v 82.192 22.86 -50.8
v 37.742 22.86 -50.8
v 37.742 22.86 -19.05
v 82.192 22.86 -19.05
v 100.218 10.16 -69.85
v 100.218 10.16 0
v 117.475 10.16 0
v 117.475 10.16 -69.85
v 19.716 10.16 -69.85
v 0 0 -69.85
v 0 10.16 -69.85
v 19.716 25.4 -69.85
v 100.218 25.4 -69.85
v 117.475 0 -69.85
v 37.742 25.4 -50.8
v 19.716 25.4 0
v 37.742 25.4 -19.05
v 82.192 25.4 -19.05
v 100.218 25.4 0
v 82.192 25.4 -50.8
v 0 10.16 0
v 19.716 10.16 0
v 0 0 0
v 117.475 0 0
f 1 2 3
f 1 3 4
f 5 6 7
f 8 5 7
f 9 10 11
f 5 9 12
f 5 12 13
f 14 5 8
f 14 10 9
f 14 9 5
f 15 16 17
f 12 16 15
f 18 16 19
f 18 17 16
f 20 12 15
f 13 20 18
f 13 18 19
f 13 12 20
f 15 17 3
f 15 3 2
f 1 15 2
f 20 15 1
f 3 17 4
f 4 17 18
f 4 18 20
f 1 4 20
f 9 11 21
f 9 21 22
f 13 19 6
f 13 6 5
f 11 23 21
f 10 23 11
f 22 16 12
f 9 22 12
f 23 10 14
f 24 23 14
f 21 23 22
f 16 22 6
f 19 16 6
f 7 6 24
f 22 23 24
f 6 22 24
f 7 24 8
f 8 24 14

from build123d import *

# Parameters (mm, degrees)
SKETCH1_W           = 117.475
SKETCH1_H           = 69.85
BOSS_EXTRUDE1_DEPTH = 25.4
SKETCH2_W           = 19.716181521
SKETCH2_H           = 69.85
SKETCH2_W_2         = 17.25680248
CUT_EXTRUDE2_DEPTH  = 15.24
SKETCH3_W           = 44.45
SKETCH3_H           = 31.75
CUT_EXTRUDE4_DEPTH  = 2.54


with BuildPart() as part:
    # Sketch1 → Boss-Extrude1 (new body)
    with BuildSketch(Plane(origin=(0, 0, 0), x_dir=(1, 0, 0), z_dir=(0, 1, 0))):
        with Locations((58.7375, 34.925)):
            Rectangle(SKETCH1_W, SKETCH1_H)
    extrude(amount=BOSS_EXTRUDE1_DEPTH)

    # Sketch2 → Cut-Extrude2 (cut)
    with BuildSketch(Plane(origin=(0, 25.4, 0), x_dir=(1, 0, 0), z_dir=(0, 1, 0))):
        with Locations((9.858090761, 34.925)):
            Rectangle(SKETCH2_W, SKETCH2_H)
        with Locations((108.84659876, 34.925)):
            Rectangle(SKETCH2_W_2, SKETCH2_H)
    extrude(amount=-CUT_EXTRUDE2_DEPTH, mode=Mode.SUBTRACT)

    # Sketch3 → Cut-Extrude4 (cut)
    with BuildSketch(Plane(origin=(0, 25.4, 0), x_dir=(1, 0, 0), z_dir=(0, 1, 0))):
        with Locations((59.96718952, 34.925)):
            Rectangle(SKETCH3_W, SKETCH3_H)
    extrude(amount=-CUT_EXTRUDE4_DEPTH, mode=Mode.SUBTRACT)


solid = part.part
